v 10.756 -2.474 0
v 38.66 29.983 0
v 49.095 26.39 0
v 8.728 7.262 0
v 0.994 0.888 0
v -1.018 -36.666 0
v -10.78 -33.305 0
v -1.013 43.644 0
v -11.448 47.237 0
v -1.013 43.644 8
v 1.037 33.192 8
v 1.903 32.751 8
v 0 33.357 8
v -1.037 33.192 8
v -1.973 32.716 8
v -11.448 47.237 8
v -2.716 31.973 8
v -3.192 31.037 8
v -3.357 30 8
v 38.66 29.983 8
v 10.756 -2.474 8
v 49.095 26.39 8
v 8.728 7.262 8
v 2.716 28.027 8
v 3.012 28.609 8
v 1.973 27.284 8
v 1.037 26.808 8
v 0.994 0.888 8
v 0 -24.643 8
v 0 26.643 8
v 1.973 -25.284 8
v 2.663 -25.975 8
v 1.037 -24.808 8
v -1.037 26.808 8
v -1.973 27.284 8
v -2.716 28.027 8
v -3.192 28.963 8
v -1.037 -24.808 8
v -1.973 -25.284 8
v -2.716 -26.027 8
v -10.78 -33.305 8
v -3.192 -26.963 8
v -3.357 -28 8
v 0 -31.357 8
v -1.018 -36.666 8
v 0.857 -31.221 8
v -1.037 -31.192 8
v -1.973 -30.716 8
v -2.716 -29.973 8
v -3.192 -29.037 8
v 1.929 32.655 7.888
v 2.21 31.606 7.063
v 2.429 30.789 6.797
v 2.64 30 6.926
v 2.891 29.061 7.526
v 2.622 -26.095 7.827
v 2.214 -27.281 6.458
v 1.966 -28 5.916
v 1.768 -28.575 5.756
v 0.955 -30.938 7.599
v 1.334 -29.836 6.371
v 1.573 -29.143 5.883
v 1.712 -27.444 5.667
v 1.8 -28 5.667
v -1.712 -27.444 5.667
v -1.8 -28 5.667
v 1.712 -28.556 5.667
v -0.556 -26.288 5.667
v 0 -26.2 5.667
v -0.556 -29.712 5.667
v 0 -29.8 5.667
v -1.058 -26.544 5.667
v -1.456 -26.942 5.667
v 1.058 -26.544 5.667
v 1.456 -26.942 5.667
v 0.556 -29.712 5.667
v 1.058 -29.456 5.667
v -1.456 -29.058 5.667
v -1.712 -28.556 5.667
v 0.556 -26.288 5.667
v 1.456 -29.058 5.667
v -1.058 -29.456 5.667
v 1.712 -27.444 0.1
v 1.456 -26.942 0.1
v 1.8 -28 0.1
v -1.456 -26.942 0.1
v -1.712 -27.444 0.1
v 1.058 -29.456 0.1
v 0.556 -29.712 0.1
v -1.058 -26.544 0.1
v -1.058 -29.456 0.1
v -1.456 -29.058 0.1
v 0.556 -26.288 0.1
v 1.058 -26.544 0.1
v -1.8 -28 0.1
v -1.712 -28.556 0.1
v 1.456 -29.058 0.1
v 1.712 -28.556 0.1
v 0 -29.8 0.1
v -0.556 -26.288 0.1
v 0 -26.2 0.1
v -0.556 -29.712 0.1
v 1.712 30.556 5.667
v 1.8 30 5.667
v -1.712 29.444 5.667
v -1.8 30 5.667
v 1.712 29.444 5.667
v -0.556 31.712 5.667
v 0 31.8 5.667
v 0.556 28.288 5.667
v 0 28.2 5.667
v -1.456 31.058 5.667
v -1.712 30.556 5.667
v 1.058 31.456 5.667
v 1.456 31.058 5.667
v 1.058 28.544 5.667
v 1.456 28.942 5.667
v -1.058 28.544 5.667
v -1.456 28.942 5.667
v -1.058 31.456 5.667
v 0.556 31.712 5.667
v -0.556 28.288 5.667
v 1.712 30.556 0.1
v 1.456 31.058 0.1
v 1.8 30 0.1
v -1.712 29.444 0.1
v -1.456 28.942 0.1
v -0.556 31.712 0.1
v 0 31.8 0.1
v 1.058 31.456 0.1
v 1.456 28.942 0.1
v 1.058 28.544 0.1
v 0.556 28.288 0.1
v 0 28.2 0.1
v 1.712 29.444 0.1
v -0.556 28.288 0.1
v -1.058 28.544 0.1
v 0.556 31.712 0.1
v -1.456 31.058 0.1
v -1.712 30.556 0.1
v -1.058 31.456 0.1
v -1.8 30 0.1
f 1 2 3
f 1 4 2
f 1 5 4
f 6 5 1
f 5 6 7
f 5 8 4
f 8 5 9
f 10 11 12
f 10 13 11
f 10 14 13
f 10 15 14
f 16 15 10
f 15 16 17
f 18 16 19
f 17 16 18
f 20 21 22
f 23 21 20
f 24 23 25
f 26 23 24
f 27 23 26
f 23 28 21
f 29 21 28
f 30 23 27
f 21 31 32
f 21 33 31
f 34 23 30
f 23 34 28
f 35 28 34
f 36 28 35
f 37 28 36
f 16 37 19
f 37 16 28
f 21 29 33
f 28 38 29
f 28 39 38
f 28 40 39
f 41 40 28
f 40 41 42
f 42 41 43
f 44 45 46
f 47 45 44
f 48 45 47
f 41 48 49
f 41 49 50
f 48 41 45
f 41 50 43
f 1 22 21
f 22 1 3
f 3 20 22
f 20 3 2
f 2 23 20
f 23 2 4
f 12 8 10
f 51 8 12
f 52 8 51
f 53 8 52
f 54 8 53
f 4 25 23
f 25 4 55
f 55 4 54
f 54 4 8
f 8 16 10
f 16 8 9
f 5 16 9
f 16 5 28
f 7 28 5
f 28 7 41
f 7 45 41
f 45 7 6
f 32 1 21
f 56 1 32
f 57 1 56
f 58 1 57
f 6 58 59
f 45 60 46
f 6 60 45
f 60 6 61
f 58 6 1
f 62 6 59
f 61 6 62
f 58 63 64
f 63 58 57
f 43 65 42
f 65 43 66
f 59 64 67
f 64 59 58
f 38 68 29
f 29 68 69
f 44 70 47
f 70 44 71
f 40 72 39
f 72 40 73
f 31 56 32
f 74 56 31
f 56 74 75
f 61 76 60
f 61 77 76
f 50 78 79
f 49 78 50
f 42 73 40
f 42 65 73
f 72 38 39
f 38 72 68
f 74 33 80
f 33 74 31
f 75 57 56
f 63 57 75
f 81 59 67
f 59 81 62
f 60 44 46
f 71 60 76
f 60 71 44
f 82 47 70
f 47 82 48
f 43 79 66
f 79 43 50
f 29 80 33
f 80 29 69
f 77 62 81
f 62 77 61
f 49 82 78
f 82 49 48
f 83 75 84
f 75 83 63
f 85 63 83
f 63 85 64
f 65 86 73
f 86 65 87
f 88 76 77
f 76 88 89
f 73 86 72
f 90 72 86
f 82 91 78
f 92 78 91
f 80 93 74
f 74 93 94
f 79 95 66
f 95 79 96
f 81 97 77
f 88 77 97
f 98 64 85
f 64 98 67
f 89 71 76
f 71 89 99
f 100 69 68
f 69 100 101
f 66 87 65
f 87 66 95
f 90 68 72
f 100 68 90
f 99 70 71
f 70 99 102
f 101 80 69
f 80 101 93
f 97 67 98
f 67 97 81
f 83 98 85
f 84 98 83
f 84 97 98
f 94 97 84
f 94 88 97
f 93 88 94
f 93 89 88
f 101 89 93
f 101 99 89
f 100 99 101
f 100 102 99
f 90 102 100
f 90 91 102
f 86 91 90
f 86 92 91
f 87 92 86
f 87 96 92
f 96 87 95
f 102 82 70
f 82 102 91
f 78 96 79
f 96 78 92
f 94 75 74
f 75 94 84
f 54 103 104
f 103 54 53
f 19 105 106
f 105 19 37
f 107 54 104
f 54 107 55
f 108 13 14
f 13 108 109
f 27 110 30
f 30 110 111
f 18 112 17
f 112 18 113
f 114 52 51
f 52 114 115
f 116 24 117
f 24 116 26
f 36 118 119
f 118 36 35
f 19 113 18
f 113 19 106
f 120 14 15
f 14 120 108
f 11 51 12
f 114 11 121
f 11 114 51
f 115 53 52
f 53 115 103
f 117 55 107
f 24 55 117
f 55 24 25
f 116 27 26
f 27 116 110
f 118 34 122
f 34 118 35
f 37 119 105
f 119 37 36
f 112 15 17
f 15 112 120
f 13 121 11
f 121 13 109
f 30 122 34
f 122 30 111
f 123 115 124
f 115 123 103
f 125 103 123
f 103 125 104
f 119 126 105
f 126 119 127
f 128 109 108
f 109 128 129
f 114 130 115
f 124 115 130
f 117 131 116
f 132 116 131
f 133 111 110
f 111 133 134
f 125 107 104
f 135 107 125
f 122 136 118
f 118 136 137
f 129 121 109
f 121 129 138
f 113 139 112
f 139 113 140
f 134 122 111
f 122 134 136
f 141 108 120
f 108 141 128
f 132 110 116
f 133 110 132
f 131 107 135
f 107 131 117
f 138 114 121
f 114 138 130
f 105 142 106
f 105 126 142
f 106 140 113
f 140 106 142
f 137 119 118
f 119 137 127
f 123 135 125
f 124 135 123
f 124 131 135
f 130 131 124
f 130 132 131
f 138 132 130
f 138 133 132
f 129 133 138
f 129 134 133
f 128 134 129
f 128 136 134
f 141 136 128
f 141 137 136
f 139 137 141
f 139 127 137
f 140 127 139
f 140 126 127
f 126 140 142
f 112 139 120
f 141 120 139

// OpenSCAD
// Street Numbers for 3D printing
// Charles Tilford, 2019
// License: CC BY-NC-SA 4.0
//   https://creativecommons.org/licenses/by-nc-sa/4.0/

char="Y";     // The number/letter to print

// Units are in mm, except for height of letter

// How many inches high should letter be?
inchesHigh=3;
// How thick/deep should letter be (mm)?
depth=8;

// Character coordinates just center the letter
charX=-26;    // Character X coord
charY=-35;    // Character Y coord
topScrew=30;  // Top screw Y coord
botScrew=-28; // Bottom screw Y coord
height=8;     // Thickness of character
// Screw dimensions. Default presumes
// #6 sheet metal screw
screwWid=3.6; // Width of screw shaft
screwTop=6.78;// Width of screw head
screwCon=5.08;// Height of head 'cone'

// Font to print in. Your system needs this
// installed, of course. If changed the hole
// positions almost certainly need to be
// changed, and maybe charX/charY.
fName="Open Sans Extrabold";
// https://fonts.google.com/specimen/Open+Sans
// Designer: Steve Matteson

// Thin floor below holes. My printer was
// struggling to have the hole 'border' stick
// to the stage. Just drill/screw thru it.
holeFloor=0.1; 

// ==========================================
// ===== All values below are auto-calculated
// ==========================================

// Scaled values
scaleFactor=inchesHigh / 3;
cX=charX * scaleFactor;
cY=charY * scaleFactor;
tS=topScrew * scaleFactor;
bS=botScrew * scaleFactor;
// Where do we start drawing screw head cone?
oS=depth - (screwCon-.05);

difference() {
  // We use difference() to punch out the screw holes
  // in the character
    
  // The character itself, 8mm thick
  rotate(a=-19)
  translate([cX,cY,0])
    linear_extrude(height=depth, scale=1)
    text(char, size=(75*scaleFactor),
         $fn=100, font=fName);
    
  // Bottom screw hole
  translate([0,bS,oS]) color("red")
    cylinder(h=screwCon, d2=screwTop,
             d1=0, $fn=20);
   translate([0,bS,holeFloor])
    cylinder(h=20, d=screwWid, $fn=20);
    
  // Top screw hole
  translate([0,tS,oS]) color("red")
    cylinder(h=screwCon, d2=screwTop,
             d1=0, $fn=20);
  translate([0,tS,holeFloor])
    cylinder(h=20, d=screwWid, $fn=20);
}

// Colors are just to aid visualization of
// void spaces. $fn is "featuer number", ie how
// many polygons are devoted to object. The values
// above should be near your printing limit anyway.

// Developed in OpenSCAD
//    https://www.openscad.org/
